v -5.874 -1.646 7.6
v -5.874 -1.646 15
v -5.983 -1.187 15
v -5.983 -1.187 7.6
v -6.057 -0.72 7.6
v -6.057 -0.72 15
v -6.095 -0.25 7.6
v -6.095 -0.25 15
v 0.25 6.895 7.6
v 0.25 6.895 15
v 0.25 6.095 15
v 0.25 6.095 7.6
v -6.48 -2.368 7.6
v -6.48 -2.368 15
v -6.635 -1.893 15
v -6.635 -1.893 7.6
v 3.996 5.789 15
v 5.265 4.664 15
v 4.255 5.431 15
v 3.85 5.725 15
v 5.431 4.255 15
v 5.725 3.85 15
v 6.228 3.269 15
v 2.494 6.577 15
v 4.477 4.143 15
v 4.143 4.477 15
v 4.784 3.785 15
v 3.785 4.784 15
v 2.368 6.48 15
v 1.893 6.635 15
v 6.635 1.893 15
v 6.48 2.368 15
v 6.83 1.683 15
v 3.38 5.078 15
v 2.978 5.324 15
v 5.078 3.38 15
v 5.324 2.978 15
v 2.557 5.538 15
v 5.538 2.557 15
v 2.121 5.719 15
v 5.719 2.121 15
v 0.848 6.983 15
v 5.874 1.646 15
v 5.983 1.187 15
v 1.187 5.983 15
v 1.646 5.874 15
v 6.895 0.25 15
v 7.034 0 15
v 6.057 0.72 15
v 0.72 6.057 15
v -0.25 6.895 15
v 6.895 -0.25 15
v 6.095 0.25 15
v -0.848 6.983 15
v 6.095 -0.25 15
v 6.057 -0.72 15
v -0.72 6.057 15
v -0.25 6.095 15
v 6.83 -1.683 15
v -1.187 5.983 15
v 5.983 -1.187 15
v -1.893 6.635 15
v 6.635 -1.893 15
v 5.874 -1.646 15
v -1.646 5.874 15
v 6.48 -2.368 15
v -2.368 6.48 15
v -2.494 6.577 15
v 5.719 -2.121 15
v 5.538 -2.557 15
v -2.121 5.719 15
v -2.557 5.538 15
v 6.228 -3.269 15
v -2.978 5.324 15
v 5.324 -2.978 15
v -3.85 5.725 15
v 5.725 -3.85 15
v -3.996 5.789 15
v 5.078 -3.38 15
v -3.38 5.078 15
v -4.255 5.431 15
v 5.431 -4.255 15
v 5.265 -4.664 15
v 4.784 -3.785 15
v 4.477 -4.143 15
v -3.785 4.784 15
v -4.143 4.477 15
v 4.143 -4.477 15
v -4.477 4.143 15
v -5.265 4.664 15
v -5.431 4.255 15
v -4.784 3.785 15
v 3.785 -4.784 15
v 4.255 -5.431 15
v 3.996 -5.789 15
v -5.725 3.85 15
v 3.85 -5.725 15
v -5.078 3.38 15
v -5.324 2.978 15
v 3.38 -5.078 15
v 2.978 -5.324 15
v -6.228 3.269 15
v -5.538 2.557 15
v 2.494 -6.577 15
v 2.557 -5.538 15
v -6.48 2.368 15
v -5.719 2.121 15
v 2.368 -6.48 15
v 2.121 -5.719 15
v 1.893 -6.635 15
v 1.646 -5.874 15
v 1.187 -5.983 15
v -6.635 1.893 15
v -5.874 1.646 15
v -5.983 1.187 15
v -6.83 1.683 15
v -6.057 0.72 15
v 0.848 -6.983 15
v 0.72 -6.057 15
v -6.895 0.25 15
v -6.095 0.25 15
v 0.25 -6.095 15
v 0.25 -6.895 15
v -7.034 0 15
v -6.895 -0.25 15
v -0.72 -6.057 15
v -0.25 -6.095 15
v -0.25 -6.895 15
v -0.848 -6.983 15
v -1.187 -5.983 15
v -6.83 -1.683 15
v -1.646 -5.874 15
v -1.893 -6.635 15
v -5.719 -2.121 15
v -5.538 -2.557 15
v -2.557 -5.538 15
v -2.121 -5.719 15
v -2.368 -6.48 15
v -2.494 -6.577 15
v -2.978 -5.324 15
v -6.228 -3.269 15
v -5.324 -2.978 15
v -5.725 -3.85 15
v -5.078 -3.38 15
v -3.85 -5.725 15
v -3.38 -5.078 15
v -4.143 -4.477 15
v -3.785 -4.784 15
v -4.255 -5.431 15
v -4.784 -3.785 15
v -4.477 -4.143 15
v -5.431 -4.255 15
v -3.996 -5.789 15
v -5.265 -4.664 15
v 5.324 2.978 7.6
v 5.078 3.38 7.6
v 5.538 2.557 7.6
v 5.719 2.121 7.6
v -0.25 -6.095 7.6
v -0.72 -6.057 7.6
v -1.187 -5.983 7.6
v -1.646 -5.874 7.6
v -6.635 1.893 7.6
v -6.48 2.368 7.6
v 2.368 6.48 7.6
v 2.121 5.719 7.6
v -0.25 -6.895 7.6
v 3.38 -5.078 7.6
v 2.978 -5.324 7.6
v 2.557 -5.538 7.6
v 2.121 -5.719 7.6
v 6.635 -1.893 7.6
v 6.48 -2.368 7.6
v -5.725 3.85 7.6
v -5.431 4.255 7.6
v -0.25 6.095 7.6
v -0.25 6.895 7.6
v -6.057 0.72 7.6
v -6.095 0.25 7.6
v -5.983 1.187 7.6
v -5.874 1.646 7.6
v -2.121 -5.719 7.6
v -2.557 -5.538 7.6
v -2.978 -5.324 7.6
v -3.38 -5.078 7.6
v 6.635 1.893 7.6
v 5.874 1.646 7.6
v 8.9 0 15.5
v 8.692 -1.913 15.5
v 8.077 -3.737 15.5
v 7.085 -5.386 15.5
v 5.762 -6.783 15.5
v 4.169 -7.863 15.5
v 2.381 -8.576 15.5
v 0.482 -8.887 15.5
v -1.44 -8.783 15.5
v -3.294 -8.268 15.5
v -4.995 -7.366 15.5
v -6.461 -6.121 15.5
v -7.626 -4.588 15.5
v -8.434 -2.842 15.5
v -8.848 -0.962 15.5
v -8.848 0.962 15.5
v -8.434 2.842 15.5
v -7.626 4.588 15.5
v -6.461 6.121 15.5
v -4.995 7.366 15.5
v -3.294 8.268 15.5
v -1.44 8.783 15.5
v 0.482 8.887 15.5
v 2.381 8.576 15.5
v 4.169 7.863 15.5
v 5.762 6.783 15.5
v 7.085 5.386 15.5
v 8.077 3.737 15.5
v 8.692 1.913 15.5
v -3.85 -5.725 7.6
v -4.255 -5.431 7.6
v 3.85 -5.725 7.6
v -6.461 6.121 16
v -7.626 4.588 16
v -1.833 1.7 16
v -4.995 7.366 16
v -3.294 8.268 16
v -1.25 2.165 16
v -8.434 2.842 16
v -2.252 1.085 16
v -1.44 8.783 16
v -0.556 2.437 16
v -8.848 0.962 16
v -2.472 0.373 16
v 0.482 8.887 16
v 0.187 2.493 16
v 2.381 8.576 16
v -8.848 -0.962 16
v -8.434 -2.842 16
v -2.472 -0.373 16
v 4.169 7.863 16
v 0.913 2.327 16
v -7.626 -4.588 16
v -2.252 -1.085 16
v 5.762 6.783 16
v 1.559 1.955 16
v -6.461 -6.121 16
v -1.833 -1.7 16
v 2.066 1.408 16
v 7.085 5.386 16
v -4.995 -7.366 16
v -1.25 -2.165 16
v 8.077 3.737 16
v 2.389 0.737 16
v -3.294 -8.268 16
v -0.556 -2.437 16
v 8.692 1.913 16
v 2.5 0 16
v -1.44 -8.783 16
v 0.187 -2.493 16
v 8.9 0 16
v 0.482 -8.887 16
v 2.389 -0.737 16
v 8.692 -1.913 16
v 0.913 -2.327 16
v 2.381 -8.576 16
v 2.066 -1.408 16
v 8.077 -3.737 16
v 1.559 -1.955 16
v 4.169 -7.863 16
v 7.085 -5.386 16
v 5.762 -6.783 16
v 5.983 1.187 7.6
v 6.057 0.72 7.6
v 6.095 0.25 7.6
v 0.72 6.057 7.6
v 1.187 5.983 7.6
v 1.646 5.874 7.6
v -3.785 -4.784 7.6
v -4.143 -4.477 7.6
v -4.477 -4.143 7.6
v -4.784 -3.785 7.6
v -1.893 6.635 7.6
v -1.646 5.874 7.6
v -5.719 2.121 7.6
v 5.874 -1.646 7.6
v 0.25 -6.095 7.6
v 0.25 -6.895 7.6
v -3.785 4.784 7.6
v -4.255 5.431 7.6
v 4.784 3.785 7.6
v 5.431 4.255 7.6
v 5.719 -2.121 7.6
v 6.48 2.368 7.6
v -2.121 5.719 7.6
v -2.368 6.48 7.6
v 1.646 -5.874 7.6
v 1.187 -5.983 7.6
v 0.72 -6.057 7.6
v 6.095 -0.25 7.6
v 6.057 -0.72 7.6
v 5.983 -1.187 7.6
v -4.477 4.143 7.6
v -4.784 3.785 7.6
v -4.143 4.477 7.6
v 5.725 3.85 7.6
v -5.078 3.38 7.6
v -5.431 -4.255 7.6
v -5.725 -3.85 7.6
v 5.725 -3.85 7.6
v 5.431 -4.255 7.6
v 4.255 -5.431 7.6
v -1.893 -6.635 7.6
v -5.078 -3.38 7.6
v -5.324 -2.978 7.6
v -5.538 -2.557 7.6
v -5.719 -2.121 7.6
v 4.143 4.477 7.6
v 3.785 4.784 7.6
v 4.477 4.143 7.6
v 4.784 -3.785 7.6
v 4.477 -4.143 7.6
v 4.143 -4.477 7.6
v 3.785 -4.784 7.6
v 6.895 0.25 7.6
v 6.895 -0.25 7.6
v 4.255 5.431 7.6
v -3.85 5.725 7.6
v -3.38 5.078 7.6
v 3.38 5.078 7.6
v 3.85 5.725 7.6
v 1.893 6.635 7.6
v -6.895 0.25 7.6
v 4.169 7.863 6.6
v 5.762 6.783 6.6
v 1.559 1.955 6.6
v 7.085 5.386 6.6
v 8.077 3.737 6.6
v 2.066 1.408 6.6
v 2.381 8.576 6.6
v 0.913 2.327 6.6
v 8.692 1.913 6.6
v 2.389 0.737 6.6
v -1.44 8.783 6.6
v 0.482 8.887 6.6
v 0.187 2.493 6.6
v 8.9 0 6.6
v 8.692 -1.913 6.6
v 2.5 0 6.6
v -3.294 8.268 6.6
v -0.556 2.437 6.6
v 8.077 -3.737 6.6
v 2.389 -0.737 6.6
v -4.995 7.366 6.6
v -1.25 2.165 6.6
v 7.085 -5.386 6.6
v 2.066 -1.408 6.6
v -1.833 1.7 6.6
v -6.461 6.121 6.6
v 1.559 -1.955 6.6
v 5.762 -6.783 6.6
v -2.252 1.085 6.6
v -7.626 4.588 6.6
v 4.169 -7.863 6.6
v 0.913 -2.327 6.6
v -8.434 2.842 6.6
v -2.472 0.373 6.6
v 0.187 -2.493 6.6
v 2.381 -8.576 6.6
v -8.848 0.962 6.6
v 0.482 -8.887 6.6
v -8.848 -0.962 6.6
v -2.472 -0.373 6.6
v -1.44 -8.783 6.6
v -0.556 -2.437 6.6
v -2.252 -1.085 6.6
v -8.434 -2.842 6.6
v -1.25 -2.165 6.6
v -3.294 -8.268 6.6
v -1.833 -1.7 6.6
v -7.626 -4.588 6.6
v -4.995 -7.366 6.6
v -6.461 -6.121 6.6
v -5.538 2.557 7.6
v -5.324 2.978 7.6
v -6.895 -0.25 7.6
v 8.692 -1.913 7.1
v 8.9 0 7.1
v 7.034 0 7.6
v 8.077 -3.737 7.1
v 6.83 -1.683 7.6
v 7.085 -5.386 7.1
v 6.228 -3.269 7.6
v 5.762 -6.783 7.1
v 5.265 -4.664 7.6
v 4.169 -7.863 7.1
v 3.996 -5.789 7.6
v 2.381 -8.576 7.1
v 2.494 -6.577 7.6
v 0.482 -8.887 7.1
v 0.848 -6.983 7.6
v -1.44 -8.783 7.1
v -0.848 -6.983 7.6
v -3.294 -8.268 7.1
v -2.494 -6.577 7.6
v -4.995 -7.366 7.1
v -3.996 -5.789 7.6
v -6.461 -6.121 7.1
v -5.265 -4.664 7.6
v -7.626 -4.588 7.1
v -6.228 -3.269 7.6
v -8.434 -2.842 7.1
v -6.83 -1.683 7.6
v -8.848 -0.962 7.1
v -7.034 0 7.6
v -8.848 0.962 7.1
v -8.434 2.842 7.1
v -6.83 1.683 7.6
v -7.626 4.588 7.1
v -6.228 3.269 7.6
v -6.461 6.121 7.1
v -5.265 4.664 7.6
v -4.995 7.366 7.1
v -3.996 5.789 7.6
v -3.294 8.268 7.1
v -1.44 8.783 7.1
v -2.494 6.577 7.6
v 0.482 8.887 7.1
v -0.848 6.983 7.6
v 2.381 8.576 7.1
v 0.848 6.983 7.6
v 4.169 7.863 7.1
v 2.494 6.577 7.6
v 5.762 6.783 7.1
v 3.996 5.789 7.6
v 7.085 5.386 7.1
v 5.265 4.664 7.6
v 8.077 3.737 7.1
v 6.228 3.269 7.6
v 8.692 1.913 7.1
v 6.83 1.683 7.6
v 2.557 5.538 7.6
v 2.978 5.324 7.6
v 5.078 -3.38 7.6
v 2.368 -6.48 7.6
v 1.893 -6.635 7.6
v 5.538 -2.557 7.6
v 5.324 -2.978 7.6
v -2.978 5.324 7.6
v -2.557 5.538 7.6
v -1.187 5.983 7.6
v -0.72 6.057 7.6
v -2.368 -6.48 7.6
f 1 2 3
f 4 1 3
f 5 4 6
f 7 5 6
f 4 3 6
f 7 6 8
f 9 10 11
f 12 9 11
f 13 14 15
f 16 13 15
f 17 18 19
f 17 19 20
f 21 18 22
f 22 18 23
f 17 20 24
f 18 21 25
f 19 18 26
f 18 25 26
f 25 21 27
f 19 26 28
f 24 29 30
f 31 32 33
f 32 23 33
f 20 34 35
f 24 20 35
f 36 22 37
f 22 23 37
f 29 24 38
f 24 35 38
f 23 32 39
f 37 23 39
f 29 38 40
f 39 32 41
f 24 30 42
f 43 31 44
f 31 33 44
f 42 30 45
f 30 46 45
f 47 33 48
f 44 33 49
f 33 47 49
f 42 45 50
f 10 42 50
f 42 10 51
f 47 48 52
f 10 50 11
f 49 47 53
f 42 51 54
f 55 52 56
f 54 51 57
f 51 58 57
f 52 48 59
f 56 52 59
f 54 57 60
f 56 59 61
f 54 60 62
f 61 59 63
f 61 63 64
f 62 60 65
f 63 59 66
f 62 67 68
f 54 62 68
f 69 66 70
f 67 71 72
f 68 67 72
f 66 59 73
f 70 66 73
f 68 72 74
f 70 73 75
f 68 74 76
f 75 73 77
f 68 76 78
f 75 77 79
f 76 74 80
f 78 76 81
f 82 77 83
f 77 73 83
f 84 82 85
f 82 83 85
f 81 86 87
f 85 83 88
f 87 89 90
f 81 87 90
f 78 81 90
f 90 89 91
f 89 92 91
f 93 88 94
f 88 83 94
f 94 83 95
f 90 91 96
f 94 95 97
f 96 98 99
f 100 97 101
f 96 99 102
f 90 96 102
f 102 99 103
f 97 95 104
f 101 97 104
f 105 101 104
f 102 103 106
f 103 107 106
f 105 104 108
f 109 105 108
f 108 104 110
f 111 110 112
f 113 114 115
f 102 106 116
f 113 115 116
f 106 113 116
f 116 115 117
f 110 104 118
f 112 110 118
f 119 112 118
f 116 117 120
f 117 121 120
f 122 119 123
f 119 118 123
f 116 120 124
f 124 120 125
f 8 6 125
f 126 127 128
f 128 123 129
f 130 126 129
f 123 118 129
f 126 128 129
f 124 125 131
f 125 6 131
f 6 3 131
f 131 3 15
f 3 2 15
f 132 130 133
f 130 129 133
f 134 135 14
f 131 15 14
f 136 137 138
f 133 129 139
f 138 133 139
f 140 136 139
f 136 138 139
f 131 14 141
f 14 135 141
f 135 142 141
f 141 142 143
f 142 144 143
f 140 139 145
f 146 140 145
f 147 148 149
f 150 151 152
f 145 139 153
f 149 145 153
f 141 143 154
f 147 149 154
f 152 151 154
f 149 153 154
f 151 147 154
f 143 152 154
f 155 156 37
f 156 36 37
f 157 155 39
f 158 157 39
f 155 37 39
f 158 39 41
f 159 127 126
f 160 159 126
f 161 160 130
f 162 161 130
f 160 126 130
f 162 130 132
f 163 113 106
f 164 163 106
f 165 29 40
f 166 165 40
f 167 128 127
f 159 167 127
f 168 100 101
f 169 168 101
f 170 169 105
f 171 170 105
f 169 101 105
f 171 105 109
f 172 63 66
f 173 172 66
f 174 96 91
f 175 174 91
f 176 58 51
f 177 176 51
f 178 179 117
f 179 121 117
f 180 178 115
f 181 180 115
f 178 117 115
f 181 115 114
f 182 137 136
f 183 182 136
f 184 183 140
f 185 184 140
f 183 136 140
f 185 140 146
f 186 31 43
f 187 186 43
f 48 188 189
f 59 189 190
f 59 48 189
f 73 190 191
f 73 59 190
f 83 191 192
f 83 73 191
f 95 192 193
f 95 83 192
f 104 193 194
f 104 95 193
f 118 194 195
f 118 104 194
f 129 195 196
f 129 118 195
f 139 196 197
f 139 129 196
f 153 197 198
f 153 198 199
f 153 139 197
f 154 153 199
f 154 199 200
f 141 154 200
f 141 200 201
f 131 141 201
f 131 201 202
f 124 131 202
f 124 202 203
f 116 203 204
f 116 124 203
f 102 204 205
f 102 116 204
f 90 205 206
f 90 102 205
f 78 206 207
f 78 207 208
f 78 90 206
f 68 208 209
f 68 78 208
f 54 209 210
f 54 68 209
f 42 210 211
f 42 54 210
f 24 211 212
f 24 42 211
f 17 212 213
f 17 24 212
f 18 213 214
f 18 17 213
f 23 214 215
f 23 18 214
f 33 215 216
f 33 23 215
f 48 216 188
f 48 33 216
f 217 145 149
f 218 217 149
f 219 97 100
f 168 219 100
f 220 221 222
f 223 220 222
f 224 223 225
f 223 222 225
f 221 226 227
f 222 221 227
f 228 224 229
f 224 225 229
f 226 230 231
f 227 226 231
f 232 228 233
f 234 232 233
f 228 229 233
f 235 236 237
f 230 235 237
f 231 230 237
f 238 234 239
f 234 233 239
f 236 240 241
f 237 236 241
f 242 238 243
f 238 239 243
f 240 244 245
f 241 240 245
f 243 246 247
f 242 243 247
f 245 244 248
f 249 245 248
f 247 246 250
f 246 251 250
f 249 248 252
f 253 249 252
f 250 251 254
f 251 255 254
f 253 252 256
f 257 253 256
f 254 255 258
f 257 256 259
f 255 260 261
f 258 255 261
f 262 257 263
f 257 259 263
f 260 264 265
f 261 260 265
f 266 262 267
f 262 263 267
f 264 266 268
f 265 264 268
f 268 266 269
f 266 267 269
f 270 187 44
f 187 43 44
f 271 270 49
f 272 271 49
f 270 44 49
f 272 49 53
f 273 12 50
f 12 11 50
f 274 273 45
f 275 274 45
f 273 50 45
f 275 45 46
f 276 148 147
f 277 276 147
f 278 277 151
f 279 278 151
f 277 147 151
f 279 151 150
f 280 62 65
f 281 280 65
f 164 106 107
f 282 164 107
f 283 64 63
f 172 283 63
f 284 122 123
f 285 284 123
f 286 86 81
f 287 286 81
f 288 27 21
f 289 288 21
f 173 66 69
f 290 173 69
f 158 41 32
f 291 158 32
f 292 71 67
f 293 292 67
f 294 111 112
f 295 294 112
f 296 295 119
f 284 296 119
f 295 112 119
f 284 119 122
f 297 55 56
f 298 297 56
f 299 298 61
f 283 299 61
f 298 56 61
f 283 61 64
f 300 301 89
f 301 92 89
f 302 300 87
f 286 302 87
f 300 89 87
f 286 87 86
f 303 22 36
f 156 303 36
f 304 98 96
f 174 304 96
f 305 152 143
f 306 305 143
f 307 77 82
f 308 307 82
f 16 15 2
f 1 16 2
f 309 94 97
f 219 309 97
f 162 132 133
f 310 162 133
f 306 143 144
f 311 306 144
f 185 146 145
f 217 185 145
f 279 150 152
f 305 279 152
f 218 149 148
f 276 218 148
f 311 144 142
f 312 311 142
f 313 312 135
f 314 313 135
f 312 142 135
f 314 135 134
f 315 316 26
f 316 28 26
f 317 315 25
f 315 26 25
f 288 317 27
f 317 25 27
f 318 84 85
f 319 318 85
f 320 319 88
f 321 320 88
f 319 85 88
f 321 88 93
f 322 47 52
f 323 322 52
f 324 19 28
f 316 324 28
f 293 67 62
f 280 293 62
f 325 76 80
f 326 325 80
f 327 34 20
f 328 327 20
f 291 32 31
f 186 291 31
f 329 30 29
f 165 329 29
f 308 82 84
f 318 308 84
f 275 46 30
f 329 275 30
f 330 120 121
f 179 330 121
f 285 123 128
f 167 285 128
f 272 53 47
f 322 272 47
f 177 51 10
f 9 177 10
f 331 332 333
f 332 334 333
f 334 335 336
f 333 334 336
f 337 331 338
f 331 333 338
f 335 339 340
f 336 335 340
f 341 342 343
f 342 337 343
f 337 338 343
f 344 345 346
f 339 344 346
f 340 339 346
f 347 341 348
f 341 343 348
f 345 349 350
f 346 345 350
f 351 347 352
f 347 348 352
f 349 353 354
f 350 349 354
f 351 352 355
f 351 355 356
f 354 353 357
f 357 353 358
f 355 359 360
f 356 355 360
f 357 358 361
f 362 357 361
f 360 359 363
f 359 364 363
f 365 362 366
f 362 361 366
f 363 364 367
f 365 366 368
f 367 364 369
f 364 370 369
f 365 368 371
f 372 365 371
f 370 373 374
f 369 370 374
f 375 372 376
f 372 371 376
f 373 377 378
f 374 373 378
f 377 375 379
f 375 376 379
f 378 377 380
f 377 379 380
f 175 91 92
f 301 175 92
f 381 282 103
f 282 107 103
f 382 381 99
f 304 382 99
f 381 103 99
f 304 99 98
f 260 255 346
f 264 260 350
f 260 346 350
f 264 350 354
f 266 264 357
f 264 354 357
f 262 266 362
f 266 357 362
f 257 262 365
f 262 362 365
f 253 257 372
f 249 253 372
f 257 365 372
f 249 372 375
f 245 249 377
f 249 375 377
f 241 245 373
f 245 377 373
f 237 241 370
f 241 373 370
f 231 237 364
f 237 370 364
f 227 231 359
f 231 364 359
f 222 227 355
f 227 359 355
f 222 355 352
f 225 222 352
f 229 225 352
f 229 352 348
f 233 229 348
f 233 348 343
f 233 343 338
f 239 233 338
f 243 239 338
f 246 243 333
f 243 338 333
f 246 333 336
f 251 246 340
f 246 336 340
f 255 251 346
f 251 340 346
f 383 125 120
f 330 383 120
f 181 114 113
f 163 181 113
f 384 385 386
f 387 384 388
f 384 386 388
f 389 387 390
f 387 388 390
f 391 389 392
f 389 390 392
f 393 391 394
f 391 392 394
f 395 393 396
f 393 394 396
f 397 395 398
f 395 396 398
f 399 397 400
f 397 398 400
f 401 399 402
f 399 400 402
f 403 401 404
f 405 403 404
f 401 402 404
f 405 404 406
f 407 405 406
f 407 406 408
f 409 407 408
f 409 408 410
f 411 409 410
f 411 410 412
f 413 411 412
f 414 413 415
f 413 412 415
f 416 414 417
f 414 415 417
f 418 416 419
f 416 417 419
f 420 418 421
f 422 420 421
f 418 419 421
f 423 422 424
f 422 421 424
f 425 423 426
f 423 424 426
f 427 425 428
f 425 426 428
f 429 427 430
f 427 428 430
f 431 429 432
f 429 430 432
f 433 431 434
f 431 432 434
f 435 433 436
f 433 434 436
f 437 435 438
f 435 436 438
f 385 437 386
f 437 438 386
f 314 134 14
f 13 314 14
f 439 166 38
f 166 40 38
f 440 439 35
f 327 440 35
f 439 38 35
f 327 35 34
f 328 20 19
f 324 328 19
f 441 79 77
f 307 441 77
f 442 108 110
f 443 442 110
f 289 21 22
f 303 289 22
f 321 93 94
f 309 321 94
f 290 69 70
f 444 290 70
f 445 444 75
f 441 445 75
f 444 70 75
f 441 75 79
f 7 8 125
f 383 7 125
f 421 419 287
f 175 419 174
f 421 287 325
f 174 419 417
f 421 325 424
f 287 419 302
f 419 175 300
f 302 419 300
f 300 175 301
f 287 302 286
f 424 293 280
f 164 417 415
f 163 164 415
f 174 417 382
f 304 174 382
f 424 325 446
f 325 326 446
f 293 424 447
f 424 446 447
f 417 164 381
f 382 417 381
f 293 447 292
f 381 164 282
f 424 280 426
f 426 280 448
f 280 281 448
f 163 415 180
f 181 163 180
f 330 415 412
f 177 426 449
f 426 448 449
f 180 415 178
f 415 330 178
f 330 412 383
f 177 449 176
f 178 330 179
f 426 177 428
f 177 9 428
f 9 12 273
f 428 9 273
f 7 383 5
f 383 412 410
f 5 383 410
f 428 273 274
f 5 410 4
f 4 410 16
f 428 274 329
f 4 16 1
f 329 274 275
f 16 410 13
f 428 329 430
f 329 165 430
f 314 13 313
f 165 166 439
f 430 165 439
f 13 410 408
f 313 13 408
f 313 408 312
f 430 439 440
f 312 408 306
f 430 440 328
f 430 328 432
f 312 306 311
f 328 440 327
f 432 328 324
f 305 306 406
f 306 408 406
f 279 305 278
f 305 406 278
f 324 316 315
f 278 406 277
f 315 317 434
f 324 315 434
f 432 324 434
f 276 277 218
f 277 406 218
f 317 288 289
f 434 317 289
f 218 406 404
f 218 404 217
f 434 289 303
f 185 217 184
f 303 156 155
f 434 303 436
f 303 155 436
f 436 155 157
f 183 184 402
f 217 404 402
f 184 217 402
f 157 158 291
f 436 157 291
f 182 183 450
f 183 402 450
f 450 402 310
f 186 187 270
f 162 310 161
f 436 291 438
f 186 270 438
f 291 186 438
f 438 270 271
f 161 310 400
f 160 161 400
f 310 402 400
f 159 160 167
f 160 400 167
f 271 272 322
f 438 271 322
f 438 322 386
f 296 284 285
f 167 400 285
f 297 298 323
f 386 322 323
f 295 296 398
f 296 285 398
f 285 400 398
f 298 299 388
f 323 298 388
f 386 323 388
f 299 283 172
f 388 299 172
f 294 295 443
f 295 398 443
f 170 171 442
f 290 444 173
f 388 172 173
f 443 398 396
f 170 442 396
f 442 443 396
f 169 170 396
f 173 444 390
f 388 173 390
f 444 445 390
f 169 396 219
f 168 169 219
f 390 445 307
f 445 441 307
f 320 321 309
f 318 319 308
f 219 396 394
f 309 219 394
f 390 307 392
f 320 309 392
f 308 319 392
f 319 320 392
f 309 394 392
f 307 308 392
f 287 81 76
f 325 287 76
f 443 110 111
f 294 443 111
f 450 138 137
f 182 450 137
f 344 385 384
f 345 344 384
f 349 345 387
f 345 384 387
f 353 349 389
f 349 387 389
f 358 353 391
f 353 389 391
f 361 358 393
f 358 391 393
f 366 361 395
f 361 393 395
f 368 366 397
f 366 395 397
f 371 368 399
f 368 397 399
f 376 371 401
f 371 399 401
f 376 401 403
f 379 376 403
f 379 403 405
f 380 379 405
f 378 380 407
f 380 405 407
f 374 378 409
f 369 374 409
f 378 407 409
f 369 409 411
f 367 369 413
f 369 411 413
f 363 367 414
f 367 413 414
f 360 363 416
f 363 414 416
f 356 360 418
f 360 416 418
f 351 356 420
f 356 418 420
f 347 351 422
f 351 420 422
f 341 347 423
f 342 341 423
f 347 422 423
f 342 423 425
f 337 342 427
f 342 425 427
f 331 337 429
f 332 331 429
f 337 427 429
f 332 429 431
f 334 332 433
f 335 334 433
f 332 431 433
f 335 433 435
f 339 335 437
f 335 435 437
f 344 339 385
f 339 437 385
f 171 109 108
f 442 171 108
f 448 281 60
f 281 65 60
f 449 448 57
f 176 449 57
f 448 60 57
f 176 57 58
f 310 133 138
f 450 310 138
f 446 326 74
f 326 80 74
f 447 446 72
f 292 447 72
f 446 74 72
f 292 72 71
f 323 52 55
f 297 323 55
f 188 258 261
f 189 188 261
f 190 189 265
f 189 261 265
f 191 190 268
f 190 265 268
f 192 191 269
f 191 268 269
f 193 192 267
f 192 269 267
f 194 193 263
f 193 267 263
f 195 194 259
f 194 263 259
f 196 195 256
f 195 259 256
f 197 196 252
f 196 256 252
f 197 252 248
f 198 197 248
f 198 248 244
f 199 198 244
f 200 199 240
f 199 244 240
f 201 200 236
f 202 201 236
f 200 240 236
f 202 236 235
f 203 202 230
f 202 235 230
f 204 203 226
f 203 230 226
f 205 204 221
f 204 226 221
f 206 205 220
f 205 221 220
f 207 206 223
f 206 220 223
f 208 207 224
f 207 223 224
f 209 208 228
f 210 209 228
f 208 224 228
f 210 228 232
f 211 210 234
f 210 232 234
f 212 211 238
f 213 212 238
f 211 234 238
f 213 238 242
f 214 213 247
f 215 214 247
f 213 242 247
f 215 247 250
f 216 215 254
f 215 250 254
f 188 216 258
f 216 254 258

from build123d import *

# Parameters (mm, degrees)
CHAMFER1_SIZE       = 0.5
CHAMFER1_SIZE2      = 1.866025404
CHAMFER2_SIZE       = 0.5
CHAMFER2_SIZE2      = 1.866025404
BOSS_EXTRUDE1_START = 7.4
BOSS_EXTRUDE1_DEPTH = 7.4


with BuildPart() as part:
    # Sketch2 → Revolve1 (revolve)
    with BuildSketch(Plane(origin=(0, 0, 0), x_dir=(0, 0, -1), z_dir=(1, 0, 0)), mode=Mode.PRIVATE) as revolve1_sk:
        Polygon((-16, 2.5), (-6.6, 2.5), (-6.6, 8.9), (-7.6, 8.9), (-7.6, 6.1), (-15, 6.1), (-15, 8.9), (-16, 8.9), align=None)
    revolve(revolve1_sk.sketch.rotate(Axis((0, 0, 79.609460318), (0, 0, -1)), 90), axis=Axis((0, 0, 79.609460318), (0, 0, -1)))

    # Chamfer1
    chamfer1_edges = [part.edges().sort_by_distance(p)[0] for p in [
        (-8.9, 0, 15),
    ]]
    chamfer1_side = [part.faces().sort_by_distance(p)[0] for p in [
        (-8.9, 0, 15.5),
    ]]
    chamfer(chamfer1_edges, length=CHAMFER1_SIZE, length2=CHAMFER1_SIZE2, reference=chamfer1_side[0])

    # Chamfer2
    chamfer2_edges = [part.edges().sort_by_distance(p)[0] for p in [
        (-8.9, 0, 7.6),
    ]]
    chamfer2_side = [part.faces().sort_by_distance(p)[0] for p in [
        (-8.9, 0, 7.1),
    ]]
    chamfer(chamfer2_edges, length=CHAMFER2_SIZE, length2=CHAMFER2_SIZE2, reference=chamfer2_side[0])

    # Sketch4 → Boss-Extrude1 (add)
    with BuildSketch(Plane.XY.offset(7.6).offset(BOSS_EXTRUDE1_START)):
        with BuildLine():
            Line((1.645655792, 5.873824735), (1.892869388, 6.634669948))
            Line((1.892869388, 6.634669948), (2.368397646, 6.48016145))
            Line((2.368397646, 6.48016145), (2.121184051, 5.719316237))
            ThreePointArc((2.121184051, 5.719316237), (1.885003666, 5.801444749), (1.645655792, 5.873824735))
        make_face()
        with BuildLine():
            Line((-0.25, 6.094874896), (-0.25, 6.894874896))
            Line((-0.25, 6.894874896), (0.25, 6.894874896))
            Line((0.25, 6.894874896), (0.25, 6.094874896))
            ThreePointArc((0.25, 6.094874896), (0, 6.1), (-0.25, 6.094874896))
        make_face()
        with BuildLine():
            Line((3.38022333, 5.077803683), (3.850451532, 5.725017278))
            Line((3.850451532, 5.725017278), (4.254960029, 5.431124652))
            Line((4.254960029, 5.431124652), (3.784731827, 4.783911057))
            ThreePointArc((3.784731827, 4.783911057), (3.585490039, 4.935003666), (3.38022333, 5.077803683))
        make_face()
        with BuildLine():
            Line((4.783911057, 3.784731827), (5.431124652, 4.254960029))
            Line((5.431124652, 4.254960029), (5.725017278, 3.850451532))
            Line((5.725017278, 3.850451532), (5.077803683, 3.38022333))
            ThreePointArc((5.077803683, 3.38022333), (4.935003666, 3.585490039), (4.783911057, 3.784731827))
        make_face()
        with BuildLine():
            Line((5.719316237, 2.121184051), (6.48016145, 2.368397646))
            Line((6.48016145, 2.368397646), (6.634669948, 1.892869388))
            Line((6.634669948, 1.892869388), (5.873824735, 1.645655792))
            ThreePointArc((5.873824735, 1.645655792), (5.801444749, 1.885003666), (5.719316237, 2.121184051))
        make_face()
        with BuildLine():
            Line((6.094874896, 0.25), (6.894874896, 0.25))
            Line((6.894874896, 0.25), (6.894874896, -0.25))
            Line((6.894874896, -0.25), (6.094874896, -0.25))
            ThreePointArc((6.094874896, -0.25), (6.1, 0), (6.094874896, 0.25))
        make_face()
        with BuildLine():
            Line((5.873824735, -1.645655792), (6.634669948, -1.892869388))
            Line((6.634669948, -1.892869388), (6.48016145, -2.368397646))
            Line((6.48016145, -2.368397646), (5.719316237, -2.121184051))
            ThreePointArc((5.719316237, -2.121184051), (5.801444749, -1.885003666), (5.873824735, -1.645655792))
        make_face()
        with BuildLine():
            Line((5.077803683, -3.38022333), (5.725017278, -3.850451532))
            Line((5.725017278, -3.850451532), (5.431124652, -4.254960029))
            Line((5.431124652, -4.254960029), (4.783911057, -3.784731827))
            ThreePointArc((4.783911057, -3.784731827), (4.935003666, -3.585490039), (5.077803683, -3.38022333))
        make_face()
        with BuildLine():
            Line((3.784731827, -4.783911057), (4.254960029, -5.431124652))
            Line((4.254960029, -5.431124652), (3.850451532, -5.725017278))
            Line((3.850451532, -5.725017278), (3.38022333, -5.077803683))
            ThreePointArc((3.38022333, -5.077803683), (3.585490039, -4.935003666), (3.784731827, -4.783911057))
        make_face()
        with BuildLine():
            Line((2.121184051, -5.719316237), (2.368397646, -6.48016145))
            Line((2.368397646, -6.48016145), (1.892869388, -6.634669948))
            Line((1.892869388, -6.634669948), (1.645655792, -5.873824735))
            ThreePointArc((1.645655792, -5.873824735), (1.885003666, -5.801444749), (2.121184051, -5.719316237))
        make_face()
        with BuildLine():
            Line((0.25, -6.094874896), (0.25, -6.894874896))
            Line((0.25, -6.894874896), (-0.25, -6.894874896))
            Line((-0.25, -6.894874896), (-0.25, -6.094874896))
            ThreePointArc((-0.25, -6.094874896), (0, -6.1), (0.25, -6.094874896))
        make_face()
        with BuildLine():
            Line((-1.645655792, -5.873824735), (-1.892869388, -6.634669948))
            Line((-1.892869388, -6.634669948), (-2.368397646, -6.48016145))
            Line((-2.368397646, -6.48016145), (-2.121184051, -5.719316237))
            ThreePointArc((-2.121184051, -5.719316237), (-1.885003666, -5.801444749), (-1.645655792, -5.873824735))
        make_face()
        with BuildLine():
            Line((-3.38022333, -5.077803683), (-3.850451532, -5.725017278))
            Line((-3.850451532, -5.725017278), (-4.254960029, -5.431124652))
            Line((-4.254960029, -5.431124652), (-3.784731827, -4.783911057))
            ThreePointArc((-3.784731827, -4.783911057), (-3.585490039, -4.935003666), (-3.38022333, -5.077803683))
        make_face()
        with BuildLine():
            Line((-4.783911057, -3.784731827), (-5.431124652, -4.254960029))
            Line((-5.431124652, -4.254960029), (-5.725017278, -3.850451532))
            Line((-5.725017278, -3.850451532), (-5.077803683, -3.38022333))
            ThreePointArc((-5.077803683, -3.38022333), (-4.935003666, -3.585490039), (-4.783911057, -3.784731827))
        make_face()
        with BuildLine():
            Line((-5.719316237, -2.121184051), (-6.48016145, -2.368397646))
            Line((-6.48016145, -2.368397646), (-6.634669948, -1.892869388))
            Line((-6.634669948, -1.892869388), (-5.873824735, -1.645655792))
            ThreePointArc((-5.873824735, -1.645655792), (-5.801444749, -1.885003666), (-5.719316237, -2.121184051))
        make_face()
        with BuildLine():
            Line((-6.094874896, -0.25), (-6.894874896, -0.25))
            Line((-6.894874896, -0.25), (-6.894874896, 0.25))
            Line((-6.894874896, 0.25), (-6.094874896, 0.25))
            ThreePointArc((-6.094874896, 0.25), (-6.1, 0), (-6.094874896, -0.25))
        make_face()
        with BuildLine():
            Line((-5.873824735, 1.645655792), (-6.634669948, 1.892869388))
            Line((-6.634669948, 1.892869388), (-6.48016145, 2.368397646))
            Line((-6.48016145, 2.368397646), (-5.719316237, 2.121184051))
            ThreePointArc((-5.719316237, 2.121184051), (-5.801444749, 1.885003666), (-5.873824735, 1.645655792))
        make_face()
        with BuildLine():
            Line((-5.077803683, 3.38022333), (-5.725017278, 3.850451532))
            Line((-5.725017278, 3.850451532), (-5.431124652, 4.254960029))
            Line((-5.431124652, 4.254960029), (-4.783911057, 3.784731827))
            ThreePointArc((-4.783911057, 3.784731827), (-4.935003666, 3.585490039), (-5.077803683, 3.38022333))
        make_face()
        with BuildLine():
            Line((-3.784731827, 4.783911057), (-4.254960029, 5.431124652))
            Line((-4.254960029, 5.431124652), (-3.850451532, 5.725017278))
            Line((-3.850451532, 5.725017278), (-3.38022333, 5.077803683))
            ThreePointArc((-3.38022333, 5.077803683), (-3.585490039, 4.935003666), (-3.784731827, 4.783911057))
        make_face()
        with BuildLine():
            Line((-2.121184051, 5.719316237), (-2.368397646, 6.48016145))
            Line((-2.368397646, 6.48016145), (-1.892869388, 6.634669948))
            Line((-1.892869388, 6.634669948), (-1.645655792, 5.873824735))
            ThreePointArc((-1.645655792, 5.873824735), (-1.885003666, 5.801444749), (-2.121184051, 5.719316237))
        make_face()
    extrude(amount=-BOSS_EXTRUDE1_DEPTH)


solid = part.part
